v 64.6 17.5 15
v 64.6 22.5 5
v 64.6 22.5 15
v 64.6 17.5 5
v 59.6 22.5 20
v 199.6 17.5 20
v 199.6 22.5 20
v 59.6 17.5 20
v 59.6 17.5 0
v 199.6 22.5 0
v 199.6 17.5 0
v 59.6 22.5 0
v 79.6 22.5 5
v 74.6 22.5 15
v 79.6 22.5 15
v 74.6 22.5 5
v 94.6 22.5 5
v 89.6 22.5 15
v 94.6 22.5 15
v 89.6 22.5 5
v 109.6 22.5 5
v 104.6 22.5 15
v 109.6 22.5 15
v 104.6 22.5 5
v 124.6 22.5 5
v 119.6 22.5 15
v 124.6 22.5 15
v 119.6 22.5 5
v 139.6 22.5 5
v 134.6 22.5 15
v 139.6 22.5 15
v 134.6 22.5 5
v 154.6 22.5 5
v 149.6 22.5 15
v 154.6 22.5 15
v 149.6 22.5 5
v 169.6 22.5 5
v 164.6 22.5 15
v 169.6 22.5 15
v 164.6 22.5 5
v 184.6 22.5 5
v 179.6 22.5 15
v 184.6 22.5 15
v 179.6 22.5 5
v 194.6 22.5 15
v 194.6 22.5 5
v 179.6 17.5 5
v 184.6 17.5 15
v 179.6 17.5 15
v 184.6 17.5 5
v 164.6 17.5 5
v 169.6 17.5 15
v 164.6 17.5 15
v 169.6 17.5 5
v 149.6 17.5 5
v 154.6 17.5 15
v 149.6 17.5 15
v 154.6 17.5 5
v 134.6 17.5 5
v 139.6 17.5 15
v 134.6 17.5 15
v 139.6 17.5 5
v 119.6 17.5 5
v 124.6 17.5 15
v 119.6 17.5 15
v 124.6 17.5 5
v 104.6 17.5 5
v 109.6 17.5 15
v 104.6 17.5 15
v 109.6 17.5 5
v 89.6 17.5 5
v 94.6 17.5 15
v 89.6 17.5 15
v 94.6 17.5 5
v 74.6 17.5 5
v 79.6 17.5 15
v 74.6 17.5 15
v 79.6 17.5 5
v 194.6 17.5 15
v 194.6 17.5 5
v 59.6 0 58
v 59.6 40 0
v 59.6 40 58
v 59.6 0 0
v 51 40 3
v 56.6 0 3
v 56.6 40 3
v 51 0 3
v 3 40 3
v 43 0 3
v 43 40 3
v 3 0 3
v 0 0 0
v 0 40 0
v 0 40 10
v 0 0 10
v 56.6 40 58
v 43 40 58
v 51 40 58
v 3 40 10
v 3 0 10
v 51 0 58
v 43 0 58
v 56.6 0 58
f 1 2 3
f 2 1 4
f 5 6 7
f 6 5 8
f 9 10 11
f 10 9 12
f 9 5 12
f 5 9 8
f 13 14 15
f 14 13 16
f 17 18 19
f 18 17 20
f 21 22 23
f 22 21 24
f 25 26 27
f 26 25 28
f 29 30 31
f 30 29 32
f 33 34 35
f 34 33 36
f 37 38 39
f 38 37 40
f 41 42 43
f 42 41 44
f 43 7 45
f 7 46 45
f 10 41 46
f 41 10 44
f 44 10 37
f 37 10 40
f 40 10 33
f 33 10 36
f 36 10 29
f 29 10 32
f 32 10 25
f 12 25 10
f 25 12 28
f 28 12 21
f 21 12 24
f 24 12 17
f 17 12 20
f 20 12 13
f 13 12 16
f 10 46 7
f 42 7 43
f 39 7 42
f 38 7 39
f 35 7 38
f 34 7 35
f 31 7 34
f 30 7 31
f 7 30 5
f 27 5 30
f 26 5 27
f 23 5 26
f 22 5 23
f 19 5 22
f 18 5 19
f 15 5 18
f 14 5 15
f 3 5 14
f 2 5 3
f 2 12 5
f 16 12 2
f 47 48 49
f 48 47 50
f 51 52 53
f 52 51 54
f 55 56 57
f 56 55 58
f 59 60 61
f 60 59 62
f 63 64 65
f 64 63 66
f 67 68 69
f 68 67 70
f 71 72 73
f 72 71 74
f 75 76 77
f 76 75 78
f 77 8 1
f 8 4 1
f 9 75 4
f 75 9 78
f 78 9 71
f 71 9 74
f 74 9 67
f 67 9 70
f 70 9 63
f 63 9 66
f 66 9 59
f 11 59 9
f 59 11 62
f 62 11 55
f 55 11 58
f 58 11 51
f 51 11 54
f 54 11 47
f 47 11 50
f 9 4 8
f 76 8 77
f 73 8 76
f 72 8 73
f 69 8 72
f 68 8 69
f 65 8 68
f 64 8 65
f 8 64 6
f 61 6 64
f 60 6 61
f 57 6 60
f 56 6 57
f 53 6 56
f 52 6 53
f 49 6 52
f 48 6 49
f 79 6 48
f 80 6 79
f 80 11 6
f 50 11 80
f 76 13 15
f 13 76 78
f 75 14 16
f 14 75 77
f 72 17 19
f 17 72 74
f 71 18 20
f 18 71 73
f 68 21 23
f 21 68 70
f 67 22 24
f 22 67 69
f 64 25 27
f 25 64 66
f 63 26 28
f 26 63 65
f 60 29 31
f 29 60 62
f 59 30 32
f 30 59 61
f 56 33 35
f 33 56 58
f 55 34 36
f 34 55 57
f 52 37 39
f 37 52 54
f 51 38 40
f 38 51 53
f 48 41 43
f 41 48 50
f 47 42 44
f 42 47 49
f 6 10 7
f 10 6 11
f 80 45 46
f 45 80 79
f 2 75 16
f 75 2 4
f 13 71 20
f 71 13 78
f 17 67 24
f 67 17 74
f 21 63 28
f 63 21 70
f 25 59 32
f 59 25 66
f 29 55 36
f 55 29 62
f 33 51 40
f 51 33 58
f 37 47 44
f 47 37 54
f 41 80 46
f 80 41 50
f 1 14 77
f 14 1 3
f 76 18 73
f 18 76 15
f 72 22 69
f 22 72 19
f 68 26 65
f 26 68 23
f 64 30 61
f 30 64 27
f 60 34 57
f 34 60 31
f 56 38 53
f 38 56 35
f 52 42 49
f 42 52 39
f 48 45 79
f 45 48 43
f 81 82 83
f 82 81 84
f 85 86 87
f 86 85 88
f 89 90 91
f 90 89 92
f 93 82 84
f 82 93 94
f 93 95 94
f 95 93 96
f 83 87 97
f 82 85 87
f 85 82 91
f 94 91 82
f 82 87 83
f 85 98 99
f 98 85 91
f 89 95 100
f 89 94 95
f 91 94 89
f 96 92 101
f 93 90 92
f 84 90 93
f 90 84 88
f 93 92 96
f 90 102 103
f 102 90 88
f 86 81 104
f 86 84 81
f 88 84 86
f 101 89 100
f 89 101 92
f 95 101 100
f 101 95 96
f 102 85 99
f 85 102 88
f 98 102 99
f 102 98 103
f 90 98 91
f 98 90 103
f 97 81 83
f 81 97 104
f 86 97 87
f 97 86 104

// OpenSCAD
/*

Copyright (c) 2014, Steven Presser
All rights reserved.

Redistribution and use in source and binary forms, with or without modification, are permitted provided that the following conditions are met:

1. Redistributions of source code must retain the above copyright notice, this list of conditions and the following disclaimer.

2. Redistributions in binary form must reproduce the above copyright notice, this list of conditions and the following disclaimer in the documentation and/or other materials provided with the distribution.

3. Neither the name of the <ORGANIZATION> nor the names of its contributors may be used to endorse or promote products derived from this software without specific prior written permission.

THIS SOFTWARE IS PROVIDED BY THE COPYRIGHT HOLDERS AND CONTRIBUTORS "AS IS" AND ANY EXPRESS OR IMPLIED WARRANTIES, INCLUDING, BUT NOT LIMITED TO, THE IMPLIED WARRANTIES OF MERCHANTABILITY AND FITNESS FOR A PARTICULAR PURPOSE ARE DISCLAIMED. IN NO EVENT SHALL THE COPYRIGHT HOLDER OR CONTRIBUTORS BE LIABLE FOR ANY DIRECT, INDIRECT, INCIDENTAL, SPECIAL, EXEMPLARY, OR CONSEQUENTIAL DAMAGES (INCLUDING, BUT NOT LIMITED TO, PROCUREMENT OF SUBSTITUTE GOODS OR SERVICES; LOSS OF USE, DATA, OR PROFITS; OR BUSINESS INTERRUPTION) HOWEVER CAUSED AND ON ANY THEORY OF LIABILITY, WHETHER IN CONTRACT, STRICT LIABILITY, OR TORT (INCLUDING NEGLIGENCE OR OTHERWISE) ARISING IN ANY WAY OUT OF THE USE OF THIS SOFTWARE, EVEN IF ADVISED OF THE POSSIBILITY OF SUCH DAMAGE.

*/

gapThick=8;
acryThick=5.6;
armThick=40;
armHeight=55;
armBackHeight=7;

wallThickness=3;
width=40;

beamLength=120;
beamThick=5;
beamHeight=20;

union() {
	cube([gapThick+acryThick+armThick+(2*wallThickness), width, wallThickness]);
	translate([0,0,wallThickness]) cube([wallThickness, width, armBackHeight]);
	translate([wallThickness+armThick,0,wallThickness]) cube([gapThick, width, armHeight]);
	translate([wallThickness+armThick+acryThick+gapThick,0,wallThickness]) cube([wallThickness, width, armHeight]);
	
	translate([(2*wallThickness)+armThick+acryThick+gapThick,width/2-beamThick/2,0]) {
		cube([beamLength+beamHeight, beamThick, beamThick]);
		translate([0,0, beamHeight-beamThick]) cube([beamLength+beamHeight, beamThick, beamThick]);
		for (x = [0:beamHeight-beamThick:beamLength+beamHeight]) {
			translate([x,0,0]) cube([beamThick,beamThick,beamHeight]);
		}
	}
}
